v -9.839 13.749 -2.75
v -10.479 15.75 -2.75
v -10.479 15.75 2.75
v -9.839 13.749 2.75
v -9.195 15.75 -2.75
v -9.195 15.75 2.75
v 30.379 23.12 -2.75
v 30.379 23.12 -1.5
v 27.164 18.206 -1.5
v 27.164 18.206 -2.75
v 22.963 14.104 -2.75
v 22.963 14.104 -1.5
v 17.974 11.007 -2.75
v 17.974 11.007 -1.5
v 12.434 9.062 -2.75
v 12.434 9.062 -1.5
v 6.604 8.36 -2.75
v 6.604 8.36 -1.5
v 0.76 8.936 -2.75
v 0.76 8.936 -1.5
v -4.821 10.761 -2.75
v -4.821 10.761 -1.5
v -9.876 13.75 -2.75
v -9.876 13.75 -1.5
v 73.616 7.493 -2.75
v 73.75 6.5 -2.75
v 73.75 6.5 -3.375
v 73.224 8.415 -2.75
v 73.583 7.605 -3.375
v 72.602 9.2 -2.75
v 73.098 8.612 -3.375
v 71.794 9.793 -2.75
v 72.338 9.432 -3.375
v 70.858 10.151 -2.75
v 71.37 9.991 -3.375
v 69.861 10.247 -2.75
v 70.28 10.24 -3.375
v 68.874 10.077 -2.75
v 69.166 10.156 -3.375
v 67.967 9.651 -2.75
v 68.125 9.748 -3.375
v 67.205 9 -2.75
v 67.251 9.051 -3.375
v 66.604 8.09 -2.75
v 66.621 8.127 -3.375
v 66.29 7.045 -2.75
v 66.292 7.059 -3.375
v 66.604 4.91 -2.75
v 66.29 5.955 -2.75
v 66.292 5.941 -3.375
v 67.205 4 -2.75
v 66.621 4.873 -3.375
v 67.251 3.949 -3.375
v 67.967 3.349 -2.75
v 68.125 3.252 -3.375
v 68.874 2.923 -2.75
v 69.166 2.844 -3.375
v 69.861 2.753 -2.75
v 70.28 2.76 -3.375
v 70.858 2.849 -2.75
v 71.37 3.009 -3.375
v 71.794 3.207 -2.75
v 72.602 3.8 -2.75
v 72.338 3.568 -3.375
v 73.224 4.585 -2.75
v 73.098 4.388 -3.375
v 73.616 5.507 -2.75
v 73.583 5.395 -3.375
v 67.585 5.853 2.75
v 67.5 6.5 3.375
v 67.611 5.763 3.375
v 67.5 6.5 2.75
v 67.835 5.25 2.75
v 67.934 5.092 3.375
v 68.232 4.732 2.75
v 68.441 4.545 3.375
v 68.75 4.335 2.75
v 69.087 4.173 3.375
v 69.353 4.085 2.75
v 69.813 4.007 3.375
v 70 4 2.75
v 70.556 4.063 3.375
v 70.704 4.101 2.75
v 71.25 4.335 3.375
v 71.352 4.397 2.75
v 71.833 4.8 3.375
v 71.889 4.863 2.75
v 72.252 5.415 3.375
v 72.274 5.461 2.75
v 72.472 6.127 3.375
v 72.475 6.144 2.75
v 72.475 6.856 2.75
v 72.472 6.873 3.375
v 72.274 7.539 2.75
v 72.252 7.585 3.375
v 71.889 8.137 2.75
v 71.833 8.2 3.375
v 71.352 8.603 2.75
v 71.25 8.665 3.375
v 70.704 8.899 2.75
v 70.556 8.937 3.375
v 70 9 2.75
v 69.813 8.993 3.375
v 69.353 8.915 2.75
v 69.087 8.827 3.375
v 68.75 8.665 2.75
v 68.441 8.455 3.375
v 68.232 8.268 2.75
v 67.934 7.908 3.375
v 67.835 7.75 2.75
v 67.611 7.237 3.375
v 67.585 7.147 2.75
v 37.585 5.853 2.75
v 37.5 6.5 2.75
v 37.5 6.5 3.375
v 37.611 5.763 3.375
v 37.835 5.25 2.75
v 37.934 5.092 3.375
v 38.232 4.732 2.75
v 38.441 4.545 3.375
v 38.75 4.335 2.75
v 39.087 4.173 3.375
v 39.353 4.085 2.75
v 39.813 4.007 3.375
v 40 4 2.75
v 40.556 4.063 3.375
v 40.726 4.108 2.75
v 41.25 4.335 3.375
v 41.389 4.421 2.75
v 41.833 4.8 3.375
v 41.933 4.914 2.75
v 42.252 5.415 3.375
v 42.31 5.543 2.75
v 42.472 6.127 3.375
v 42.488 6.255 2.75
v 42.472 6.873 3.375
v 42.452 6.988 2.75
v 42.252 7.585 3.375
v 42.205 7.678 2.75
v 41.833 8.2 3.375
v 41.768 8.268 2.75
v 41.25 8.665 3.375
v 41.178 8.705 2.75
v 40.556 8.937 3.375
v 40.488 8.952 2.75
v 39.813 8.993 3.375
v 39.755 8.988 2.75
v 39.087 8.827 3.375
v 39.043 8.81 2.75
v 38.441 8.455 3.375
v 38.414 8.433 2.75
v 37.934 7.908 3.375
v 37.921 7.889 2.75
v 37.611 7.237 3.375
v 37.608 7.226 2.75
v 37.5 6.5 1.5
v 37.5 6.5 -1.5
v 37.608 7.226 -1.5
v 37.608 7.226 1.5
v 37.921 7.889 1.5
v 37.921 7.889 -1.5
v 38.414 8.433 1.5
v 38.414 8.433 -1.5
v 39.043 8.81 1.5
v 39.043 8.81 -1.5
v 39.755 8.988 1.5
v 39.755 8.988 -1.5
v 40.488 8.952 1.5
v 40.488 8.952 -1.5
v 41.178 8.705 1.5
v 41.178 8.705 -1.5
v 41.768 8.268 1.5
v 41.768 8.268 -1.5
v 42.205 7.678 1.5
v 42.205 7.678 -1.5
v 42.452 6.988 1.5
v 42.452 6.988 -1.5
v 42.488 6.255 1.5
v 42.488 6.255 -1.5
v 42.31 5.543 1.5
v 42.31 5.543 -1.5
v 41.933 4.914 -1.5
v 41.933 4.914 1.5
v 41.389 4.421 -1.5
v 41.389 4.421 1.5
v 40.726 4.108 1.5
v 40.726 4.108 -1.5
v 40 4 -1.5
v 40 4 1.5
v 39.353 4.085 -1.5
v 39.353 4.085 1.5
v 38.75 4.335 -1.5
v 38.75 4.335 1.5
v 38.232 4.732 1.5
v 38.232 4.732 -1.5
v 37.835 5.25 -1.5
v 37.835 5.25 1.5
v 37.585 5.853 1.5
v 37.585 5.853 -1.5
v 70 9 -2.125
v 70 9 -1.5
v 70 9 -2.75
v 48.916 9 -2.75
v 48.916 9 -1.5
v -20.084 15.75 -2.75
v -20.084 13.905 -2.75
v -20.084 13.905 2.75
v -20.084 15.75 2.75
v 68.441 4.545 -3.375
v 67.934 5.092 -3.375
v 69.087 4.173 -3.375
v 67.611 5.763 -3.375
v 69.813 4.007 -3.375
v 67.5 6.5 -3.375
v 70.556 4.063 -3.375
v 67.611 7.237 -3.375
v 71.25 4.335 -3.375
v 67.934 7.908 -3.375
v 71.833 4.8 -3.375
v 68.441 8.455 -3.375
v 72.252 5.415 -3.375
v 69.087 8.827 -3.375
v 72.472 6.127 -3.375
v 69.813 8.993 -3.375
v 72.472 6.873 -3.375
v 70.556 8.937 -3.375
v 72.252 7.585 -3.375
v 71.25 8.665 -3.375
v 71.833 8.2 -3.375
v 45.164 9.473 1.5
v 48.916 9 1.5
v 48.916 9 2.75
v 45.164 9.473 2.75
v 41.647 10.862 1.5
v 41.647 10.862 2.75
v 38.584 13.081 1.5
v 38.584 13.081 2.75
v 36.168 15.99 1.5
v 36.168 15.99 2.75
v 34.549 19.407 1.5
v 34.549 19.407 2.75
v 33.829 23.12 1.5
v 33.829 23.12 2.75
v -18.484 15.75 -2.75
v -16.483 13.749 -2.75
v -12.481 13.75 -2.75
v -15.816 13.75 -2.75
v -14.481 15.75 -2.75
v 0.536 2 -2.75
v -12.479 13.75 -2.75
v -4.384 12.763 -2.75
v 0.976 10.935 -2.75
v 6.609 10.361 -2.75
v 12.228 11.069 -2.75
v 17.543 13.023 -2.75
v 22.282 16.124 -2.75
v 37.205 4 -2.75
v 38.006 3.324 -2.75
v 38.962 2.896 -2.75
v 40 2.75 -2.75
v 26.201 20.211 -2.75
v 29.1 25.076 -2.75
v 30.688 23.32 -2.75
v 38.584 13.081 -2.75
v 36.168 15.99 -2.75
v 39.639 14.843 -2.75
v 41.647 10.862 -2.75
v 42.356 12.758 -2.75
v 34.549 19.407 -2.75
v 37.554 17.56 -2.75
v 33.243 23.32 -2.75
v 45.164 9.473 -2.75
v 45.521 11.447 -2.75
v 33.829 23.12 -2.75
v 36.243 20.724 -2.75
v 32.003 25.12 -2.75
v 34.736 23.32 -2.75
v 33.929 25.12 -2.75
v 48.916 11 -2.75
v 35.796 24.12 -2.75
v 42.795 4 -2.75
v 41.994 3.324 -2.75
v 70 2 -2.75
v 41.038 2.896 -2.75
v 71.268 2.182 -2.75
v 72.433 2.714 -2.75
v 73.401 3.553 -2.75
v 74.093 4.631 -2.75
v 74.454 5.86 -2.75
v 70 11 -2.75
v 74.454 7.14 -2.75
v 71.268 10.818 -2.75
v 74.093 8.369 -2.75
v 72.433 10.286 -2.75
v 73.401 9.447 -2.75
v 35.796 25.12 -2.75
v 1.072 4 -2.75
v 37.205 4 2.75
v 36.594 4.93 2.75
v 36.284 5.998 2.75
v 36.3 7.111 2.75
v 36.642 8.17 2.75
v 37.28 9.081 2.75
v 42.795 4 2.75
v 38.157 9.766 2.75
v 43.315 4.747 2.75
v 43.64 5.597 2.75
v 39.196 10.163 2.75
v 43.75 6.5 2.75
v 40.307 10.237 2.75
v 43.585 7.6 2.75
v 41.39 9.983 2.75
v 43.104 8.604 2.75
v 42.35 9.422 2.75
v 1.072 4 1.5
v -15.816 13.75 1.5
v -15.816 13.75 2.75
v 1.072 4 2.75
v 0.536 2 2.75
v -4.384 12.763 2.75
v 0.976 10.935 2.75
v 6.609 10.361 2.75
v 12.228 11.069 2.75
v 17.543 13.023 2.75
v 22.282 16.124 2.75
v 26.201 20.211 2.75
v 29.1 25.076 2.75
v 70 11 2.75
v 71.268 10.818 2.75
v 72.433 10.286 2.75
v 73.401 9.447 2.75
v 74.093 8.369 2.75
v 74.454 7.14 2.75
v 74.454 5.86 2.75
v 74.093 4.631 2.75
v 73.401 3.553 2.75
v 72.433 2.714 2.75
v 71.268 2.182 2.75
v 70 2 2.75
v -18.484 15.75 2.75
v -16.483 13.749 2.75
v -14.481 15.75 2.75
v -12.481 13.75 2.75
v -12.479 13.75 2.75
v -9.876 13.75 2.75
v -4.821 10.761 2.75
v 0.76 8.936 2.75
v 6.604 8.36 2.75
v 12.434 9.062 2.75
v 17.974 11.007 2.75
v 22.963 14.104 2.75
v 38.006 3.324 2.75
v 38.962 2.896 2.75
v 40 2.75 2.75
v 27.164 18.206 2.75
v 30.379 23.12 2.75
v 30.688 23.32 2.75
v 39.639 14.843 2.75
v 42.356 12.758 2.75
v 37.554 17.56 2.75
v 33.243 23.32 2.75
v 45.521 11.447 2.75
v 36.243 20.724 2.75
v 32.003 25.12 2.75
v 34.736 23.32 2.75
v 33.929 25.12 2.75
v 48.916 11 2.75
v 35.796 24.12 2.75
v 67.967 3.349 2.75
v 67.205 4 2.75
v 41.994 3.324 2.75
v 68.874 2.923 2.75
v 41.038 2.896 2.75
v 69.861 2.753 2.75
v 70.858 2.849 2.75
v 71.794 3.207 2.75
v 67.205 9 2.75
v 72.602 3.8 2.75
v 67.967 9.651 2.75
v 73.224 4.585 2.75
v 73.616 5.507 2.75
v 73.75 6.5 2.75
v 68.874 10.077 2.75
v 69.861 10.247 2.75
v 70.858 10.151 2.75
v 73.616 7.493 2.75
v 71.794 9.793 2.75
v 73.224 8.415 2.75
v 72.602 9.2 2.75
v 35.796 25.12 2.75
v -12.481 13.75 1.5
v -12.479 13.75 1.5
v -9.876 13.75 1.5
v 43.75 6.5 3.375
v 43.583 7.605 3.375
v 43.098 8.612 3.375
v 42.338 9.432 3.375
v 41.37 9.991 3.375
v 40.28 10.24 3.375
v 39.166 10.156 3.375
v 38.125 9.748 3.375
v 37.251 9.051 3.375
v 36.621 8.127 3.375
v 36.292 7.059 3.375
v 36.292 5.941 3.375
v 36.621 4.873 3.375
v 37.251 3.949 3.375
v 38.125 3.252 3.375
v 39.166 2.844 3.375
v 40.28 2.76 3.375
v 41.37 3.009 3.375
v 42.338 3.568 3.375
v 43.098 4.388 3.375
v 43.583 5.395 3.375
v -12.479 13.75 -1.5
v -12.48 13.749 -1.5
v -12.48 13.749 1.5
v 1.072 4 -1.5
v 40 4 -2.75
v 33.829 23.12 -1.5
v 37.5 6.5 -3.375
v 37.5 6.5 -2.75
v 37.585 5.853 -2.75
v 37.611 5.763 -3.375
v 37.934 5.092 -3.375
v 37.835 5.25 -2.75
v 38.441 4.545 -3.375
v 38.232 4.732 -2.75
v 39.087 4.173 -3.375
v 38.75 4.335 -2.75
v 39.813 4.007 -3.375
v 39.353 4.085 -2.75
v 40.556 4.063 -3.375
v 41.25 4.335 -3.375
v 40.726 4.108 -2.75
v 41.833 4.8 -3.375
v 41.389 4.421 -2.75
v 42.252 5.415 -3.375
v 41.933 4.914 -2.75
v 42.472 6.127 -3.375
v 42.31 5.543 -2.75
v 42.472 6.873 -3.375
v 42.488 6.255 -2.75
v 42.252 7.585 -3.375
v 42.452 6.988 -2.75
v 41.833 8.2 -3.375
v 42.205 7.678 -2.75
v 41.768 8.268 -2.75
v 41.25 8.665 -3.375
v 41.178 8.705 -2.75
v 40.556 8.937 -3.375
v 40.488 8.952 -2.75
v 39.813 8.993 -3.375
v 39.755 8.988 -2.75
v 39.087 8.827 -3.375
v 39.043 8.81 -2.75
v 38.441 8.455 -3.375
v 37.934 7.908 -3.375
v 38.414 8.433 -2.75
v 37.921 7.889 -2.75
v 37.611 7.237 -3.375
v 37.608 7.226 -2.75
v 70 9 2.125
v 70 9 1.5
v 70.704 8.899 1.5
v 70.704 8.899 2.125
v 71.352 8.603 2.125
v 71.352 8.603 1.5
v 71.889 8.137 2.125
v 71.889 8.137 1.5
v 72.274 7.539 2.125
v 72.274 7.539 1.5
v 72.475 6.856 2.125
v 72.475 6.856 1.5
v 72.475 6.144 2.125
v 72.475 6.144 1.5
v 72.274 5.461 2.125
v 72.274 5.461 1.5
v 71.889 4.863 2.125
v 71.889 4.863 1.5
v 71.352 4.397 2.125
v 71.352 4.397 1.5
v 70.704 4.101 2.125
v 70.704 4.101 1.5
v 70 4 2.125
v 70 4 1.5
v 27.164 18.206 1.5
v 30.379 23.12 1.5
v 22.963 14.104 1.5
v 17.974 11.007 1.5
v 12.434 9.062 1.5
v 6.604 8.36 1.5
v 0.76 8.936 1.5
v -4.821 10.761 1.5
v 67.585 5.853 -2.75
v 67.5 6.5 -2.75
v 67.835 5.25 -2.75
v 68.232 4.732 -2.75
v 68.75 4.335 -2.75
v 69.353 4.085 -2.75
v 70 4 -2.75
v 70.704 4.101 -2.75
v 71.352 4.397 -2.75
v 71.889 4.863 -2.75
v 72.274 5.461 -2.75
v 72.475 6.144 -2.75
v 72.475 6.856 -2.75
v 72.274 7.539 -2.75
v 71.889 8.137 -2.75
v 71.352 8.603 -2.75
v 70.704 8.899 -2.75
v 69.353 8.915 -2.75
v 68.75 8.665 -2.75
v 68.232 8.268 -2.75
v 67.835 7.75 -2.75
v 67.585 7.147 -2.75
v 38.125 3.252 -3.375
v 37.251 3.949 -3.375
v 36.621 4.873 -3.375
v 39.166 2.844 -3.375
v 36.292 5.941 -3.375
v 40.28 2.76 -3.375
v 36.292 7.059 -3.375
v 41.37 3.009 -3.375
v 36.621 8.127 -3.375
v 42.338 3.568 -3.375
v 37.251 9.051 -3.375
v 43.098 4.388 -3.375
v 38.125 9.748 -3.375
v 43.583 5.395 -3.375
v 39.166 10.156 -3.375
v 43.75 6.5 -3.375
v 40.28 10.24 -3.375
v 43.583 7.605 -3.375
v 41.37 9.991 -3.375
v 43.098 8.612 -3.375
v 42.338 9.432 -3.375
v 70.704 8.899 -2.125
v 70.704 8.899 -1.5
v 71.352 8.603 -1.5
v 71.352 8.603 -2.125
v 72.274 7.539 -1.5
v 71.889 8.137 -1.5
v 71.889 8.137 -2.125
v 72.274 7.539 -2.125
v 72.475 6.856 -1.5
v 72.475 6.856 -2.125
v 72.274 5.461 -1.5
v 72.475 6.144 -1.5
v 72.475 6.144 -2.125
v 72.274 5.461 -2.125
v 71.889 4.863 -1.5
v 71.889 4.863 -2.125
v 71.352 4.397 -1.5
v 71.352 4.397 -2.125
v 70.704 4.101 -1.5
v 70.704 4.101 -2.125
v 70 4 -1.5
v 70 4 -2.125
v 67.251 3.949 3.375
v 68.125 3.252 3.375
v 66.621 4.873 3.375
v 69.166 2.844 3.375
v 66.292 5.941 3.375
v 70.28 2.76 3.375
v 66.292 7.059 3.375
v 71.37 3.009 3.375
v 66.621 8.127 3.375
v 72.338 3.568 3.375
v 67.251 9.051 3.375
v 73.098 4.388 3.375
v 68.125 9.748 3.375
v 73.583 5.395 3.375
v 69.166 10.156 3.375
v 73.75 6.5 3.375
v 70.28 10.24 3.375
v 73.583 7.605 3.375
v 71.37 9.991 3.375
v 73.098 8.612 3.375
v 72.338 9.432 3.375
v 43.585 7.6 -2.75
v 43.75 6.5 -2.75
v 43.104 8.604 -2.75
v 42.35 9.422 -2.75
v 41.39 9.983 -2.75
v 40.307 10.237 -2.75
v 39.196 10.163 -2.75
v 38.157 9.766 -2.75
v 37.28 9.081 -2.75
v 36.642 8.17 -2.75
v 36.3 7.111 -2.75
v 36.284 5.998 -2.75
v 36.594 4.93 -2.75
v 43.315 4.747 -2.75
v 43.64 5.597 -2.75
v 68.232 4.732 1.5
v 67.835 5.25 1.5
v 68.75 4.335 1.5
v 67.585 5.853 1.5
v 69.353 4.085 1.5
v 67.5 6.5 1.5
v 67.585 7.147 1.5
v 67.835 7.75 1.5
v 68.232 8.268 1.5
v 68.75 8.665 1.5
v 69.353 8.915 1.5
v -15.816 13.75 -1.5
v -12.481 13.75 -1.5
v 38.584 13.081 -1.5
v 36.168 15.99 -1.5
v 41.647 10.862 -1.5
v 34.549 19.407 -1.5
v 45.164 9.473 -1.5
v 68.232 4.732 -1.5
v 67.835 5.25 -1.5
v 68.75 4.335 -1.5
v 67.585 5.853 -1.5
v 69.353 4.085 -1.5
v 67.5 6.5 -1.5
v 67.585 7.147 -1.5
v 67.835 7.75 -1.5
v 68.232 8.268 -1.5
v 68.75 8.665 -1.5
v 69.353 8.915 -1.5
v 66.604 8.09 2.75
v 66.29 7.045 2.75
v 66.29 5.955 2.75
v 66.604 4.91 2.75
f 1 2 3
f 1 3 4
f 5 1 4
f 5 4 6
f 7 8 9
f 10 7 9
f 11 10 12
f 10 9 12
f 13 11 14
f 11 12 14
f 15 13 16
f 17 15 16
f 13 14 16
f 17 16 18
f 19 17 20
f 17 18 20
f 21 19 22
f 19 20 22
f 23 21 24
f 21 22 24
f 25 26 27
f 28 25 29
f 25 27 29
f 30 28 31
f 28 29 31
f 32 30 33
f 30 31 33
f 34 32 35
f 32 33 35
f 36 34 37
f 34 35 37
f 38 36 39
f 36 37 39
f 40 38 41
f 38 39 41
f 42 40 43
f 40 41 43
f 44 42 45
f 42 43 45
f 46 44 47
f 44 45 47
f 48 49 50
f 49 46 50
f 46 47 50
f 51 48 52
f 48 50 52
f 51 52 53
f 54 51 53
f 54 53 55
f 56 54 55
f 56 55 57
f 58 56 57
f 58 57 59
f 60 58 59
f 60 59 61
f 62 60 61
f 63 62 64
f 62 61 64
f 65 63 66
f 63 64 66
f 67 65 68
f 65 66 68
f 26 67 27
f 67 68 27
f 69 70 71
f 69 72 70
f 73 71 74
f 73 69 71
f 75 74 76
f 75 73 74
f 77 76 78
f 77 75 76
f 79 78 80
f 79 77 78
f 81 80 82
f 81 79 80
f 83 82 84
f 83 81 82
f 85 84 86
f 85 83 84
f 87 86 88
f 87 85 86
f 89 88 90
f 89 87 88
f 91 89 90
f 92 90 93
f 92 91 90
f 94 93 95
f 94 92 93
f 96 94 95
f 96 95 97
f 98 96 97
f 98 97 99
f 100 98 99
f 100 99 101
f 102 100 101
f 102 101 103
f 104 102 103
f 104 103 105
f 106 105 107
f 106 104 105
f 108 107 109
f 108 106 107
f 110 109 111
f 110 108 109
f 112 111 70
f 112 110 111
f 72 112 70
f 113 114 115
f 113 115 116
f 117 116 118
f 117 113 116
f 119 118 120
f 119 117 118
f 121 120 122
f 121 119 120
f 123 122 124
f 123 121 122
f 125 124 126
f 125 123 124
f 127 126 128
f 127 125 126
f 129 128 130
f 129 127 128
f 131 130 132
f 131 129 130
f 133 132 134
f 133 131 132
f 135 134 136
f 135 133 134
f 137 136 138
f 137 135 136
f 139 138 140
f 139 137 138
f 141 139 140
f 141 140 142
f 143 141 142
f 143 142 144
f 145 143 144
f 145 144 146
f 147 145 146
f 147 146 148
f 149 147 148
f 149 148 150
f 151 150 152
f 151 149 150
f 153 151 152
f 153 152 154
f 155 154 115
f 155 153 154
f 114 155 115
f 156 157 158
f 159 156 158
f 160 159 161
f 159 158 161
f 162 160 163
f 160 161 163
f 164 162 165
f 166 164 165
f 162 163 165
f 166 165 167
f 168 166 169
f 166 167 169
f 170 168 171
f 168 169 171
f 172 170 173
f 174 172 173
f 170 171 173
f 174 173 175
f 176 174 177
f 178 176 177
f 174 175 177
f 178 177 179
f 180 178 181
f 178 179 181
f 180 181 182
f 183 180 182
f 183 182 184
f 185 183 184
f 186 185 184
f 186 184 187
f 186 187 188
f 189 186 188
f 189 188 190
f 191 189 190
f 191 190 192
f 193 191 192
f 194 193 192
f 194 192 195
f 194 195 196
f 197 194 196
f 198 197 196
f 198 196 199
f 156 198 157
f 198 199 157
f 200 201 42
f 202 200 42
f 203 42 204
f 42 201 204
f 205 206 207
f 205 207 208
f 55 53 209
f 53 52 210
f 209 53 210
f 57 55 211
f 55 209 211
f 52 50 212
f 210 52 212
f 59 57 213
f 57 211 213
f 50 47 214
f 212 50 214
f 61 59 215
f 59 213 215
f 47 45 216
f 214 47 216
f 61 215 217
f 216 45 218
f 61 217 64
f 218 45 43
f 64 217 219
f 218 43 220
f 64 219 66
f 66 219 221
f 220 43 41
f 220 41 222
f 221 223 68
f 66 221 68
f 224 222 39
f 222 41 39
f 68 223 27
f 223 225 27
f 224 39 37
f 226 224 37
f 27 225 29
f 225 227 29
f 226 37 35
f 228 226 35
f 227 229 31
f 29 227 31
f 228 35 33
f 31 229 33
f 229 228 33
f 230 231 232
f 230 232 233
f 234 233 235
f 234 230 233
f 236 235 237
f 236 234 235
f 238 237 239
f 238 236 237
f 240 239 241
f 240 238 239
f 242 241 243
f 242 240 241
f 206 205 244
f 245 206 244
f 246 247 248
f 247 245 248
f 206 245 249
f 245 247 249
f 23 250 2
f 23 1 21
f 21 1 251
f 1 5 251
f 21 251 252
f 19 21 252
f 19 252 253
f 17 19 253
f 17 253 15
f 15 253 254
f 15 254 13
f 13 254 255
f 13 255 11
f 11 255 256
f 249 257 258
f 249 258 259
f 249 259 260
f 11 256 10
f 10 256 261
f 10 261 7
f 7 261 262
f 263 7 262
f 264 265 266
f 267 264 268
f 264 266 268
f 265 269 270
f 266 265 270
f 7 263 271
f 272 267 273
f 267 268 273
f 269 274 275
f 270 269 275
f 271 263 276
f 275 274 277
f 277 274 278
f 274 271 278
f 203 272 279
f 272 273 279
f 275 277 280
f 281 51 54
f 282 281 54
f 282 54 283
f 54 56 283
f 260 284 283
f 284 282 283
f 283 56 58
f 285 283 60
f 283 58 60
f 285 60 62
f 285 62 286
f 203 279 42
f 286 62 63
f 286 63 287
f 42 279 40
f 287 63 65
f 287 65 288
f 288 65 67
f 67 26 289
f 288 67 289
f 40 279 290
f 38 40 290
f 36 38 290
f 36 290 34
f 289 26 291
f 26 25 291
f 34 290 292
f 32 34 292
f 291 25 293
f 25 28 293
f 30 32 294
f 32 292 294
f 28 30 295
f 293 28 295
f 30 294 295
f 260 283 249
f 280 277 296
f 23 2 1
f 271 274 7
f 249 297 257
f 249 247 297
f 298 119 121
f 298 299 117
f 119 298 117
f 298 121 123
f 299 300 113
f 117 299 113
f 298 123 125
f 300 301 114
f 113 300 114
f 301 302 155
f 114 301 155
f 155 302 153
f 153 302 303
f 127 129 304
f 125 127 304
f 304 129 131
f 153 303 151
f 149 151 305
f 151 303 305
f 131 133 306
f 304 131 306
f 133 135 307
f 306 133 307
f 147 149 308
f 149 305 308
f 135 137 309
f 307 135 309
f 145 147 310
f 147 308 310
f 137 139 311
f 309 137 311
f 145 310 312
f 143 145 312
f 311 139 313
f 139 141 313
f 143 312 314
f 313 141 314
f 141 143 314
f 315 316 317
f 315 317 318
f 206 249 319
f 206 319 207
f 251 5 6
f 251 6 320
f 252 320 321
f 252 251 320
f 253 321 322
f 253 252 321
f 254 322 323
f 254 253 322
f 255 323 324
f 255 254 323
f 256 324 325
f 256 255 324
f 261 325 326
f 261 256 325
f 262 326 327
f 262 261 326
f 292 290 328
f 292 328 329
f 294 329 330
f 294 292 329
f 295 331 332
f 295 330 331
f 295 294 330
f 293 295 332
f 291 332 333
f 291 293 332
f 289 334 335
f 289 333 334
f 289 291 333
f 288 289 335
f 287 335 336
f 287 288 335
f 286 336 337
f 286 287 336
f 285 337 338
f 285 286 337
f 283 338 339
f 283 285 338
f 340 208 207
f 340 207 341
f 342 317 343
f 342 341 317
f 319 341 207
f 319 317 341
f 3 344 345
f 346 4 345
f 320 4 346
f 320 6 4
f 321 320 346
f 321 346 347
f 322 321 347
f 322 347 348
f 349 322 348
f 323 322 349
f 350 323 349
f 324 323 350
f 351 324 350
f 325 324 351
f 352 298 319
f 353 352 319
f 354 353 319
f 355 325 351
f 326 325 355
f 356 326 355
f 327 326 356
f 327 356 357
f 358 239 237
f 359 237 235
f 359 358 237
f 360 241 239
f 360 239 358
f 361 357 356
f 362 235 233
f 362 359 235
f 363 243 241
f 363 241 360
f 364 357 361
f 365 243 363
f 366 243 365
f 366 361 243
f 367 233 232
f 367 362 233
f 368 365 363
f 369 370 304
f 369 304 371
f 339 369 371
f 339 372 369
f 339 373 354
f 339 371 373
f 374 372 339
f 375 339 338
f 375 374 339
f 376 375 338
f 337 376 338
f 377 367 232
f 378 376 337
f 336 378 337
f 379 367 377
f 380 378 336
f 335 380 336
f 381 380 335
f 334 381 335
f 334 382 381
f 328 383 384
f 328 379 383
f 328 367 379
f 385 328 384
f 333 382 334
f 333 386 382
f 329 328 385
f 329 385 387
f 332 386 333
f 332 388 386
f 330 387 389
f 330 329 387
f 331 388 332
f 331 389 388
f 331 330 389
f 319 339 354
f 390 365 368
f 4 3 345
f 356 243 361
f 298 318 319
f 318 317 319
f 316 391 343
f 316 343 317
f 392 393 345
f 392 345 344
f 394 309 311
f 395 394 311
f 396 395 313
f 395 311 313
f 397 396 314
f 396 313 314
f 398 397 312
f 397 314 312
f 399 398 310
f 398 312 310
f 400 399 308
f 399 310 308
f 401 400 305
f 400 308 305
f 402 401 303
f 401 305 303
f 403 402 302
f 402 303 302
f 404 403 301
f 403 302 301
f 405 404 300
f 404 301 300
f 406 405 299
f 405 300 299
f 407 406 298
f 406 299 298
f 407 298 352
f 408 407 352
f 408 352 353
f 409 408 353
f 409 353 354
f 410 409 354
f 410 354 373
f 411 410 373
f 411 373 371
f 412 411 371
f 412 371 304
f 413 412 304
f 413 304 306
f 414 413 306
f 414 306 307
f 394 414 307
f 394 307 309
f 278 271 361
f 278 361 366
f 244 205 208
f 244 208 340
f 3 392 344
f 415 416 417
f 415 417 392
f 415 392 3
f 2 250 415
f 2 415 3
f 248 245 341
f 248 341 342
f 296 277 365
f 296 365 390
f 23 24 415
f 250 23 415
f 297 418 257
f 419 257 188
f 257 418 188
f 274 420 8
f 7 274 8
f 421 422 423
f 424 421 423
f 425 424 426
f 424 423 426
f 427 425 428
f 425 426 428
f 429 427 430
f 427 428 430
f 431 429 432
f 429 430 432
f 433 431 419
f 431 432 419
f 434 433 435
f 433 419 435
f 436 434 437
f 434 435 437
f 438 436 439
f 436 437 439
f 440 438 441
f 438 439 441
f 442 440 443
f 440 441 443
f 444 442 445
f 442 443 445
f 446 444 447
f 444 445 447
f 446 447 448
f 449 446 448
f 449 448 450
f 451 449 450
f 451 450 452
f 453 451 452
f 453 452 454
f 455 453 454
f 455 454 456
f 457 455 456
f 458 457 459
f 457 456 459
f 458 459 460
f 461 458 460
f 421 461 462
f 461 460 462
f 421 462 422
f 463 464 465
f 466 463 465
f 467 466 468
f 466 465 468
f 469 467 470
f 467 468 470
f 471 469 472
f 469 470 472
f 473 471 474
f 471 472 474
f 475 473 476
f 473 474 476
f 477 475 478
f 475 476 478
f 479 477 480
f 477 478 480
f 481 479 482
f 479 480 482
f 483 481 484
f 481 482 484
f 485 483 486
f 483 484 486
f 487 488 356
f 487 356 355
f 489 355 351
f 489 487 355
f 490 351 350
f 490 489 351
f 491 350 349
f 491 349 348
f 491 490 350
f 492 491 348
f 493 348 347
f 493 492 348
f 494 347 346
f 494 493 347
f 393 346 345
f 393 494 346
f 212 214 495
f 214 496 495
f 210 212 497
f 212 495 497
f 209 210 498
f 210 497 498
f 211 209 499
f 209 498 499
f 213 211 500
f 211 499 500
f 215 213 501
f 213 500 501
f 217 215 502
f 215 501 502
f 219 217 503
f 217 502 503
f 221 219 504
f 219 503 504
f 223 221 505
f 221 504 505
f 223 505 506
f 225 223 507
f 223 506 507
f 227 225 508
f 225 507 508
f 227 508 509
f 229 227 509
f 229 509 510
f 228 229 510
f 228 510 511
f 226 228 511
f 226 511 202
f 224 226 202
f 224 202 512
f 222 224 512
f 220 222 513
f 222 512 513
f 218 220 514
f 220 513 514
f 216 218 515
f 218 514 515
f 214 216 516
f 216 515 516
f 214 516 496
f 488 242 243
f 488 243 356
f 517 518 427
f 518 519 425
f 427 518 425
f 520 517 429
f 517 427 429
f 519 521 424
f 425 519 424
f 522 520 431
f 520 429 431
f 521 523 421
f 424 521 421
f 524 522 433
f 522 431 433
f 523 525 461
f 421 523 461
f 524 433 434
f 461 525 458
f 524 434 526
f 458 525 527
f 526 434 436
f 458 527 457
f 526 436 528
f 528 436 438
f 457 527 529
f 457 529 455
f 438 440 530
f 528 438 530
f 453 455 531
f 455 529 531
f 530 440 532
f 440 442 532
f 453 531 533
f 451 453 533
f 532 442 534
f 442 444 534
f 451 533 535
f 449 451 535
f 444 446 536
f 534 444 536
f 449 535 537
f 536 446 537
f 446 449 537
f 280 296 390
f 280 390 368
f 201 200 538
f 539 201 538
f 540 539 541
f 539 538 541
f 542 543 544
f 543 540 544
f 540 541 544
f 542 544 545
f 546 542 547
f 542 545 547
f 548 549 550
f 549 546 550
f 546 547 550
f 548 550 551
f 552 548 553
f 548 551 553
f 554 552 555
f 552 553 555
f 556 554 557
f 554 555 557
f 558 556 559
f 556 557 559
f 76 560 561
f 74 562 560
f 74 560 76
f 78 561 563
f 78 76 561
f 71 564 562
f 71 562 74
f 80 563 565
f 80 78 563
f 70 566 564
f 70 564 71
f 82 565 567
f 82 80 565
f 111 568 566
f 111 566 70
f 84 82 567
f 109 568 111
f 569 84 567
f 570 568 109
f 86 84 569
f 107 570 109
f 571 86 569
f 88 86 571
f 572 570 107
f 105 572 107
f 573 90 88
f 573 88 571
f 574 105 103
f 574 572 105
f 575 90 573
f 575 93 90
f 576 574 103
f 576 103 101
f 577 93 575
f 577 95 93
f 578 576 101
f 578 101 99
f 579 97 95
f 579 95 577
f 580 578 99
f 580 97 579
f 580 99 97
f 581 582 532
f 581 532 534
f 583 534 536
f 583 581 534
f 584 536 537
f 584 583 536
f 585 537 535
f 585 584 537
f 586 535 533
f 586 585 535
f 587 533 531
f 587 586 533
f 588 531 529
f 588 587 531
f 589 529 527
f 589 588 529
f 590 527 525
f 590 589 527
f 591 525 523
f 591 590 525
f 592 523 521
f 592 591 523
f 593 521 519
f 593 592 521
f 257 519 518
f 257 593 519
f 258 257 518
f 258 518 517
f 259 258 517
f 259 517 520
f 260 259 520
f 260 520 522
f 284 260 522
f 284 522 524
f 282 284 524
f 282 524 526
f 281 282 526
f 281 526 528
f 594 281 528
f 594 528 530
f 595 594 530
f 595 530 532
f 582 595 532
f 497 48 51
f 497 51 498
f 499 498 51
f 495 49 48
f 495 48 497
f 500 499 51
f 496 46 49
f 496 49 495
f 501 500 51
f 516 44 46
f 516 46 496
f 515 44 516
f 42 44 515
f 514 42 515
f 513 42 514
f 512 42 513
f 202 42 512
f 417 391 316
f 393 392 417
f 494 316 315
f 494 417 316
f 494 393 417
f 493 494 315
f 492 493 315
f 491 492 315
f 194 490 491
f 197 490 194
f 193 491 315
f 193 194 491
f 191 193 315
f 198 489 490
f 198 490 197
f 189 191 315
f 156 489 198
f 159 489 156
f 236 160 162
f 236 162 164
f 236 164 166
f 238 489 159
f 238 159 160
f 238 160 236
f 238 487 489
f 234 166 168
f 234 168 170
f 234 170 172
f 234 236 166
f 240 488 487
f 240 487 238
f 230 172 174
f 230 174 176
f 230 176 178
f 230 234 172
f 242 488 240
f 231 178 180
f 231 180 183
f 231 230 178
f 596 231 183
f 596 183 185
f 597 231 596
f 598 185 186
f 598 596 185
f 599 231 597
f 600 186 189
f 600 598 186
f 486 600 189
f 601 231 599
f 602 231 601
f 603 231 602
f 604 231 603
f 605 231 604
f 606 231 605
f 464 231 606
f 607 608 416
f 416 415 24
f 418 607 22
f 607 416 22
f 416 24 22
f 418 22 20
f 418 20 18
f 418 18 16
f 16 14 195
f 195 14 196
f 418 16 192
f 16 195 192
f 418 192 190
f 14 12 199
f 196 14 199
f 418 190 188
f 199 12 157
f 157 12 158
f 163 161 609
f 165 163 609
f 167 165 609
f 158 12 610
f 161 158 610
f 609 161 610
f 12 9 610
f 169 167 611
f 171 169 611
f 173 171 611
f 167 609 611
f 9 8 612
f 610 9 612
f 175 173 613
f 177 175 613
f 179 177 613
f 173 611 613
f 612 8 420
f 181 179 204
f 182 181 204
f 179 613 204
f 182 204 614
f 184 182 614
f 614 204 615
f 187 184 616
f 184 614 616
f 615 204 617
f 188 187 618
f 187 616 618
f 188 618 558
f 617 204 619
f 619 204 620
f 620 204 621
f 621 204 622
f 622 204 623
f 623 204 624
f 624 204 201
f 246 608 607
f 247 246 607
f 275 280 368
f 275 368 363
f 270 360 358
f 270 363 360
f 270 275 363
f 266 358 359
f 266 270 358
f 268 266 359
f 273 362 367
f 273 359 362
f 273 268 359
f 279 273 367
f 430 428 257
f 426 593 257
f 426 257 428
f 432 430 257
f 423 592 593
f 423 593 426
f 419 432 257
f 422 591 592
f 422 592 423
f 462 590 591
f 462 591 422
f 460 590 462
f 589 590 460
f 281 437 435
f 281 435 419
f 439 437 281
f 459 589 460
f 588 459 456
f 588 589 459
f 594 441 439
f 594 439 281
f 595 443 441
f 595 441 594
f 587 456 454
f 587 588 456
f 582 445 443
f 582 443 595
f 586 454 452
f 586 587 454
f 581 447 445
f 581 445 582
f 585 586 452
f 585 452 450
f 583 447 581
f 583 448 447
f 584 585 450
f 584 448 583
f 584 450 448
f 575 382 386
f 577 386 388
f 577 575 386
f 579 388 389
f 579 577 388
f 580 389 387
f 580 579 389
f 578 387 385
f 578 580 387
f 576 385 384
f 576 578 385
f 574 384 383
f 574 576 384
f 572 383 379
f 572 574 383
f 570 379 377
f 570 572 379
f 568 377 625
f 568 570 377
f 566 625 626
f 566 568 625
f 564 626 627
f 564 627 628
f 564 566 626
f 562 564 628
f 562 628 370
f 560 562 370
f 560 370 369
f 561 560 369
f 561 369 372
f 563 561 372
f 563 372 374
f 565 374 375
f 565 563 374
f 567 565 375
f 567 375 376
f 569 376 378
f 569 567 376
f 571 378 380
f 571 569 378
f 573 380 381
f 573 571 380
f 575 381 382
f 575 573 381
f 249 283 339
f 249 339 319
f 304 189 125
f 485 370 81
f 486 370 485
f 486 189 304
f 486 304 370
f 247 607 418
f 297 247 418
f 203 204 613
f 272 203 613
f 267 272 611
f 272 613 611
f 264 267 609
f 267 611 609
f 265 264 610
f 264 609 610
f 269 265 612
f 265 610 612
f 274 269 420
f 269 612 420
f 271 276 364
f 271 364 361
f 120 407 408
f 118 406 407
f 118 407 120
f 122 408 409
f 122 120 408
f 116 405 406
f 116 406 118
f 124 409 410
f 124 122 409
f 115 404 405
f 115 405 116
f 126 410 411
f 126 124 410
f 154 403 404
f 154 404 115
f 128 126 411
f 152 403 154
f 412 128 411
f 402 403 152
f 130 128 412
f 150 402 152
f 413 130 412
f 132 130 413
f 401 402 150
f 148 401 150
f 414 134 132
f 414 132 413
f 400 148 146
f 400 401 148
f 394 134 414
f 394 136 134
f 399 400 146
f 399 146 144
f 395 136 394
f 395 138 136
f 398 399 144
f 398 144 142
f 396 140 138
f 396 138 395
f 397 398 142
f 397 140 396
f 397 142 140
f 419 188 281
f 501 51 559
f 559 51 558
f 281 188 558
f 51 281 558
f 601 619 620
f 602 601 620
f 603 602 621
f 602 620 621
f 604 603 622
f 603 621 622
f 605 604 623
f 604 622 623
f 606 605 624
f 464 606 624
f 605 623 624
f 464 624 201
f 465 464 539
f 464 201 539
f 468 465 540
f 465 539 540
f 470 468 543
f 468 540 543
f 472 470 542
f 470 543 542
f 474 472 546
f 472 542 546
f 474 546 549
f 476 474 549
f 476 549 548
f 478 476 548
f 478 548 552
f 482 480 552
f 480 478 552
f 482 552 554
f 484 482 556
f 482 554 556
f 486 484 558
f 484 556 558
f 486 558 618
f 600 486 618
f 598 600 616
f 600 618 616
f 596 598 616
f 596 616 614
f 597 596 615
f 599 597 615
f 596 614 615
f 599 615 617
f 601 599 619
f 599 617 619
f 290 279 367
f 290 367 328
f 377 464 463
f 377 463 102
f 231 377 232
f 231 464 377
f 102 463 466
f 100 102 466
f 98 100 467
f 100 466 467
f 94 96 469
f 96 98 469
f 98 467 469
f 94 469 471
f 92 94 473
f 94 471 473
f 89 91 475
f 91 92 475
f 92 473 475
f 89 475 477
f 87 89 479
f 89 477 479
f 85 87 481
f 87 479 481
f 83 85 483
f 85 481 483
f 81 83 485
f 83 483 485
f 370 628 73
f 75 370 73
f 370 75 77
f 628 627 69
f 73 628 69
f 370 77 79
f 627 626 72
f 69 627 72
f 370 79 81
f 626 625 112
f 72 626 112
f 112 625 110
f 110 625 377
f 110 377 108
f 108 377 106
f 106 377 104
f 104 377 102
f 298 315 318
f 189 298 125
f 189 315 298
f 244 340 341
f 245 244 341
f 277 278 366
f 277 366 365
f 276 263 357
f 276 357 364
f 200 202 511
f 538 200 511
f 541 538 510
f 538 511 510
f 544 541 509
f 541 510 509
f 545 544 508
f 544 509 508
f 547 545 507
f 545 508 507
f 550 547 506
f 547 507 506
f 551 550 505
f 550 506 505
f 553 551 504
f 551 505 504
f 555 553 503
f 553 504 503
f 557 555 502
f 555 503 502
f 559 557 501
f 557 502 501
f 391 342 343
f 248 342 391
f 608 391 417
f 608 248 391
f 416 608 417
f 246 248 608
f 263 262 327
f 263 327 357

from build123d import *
from build123d.topology import SkipClean

# Parameters (mm, degrees)
BOSS_EXTRUDE1_DEPTH     = 4
SKETCH3_R               = 2.5
CUT_EXTRUDE1_DEPTH      = 82.558227053
CUT_EXTRUDE2_DEPTH      = 1.25
SKETCH5_R               = 3.75
SKETCH5_R_2             = 2.5
BOSS_EXTRUDE2_DEPTH     = 0.625
CUT_EXTRUDE3_DEPTH      = 82.558227053
CUT_EXTRUDE4_START      = -1.25
CUT_EXTRUDE4_DEPTH      = 1.25
CUT_EXTRUDE5_DEPTH      = 79.859241849
CUT_EXTRUDE5_DEPTH_BACK = 79.859241849
CUT_EXTRUDE6_DEPTH      = 79.859241849
CUT_EXTRUDE6_DEPTH_BACK = 79.859241849


with BuildPart() as part:
    # Sketch1 → Boss-Extrude1 (new, symmetric)
    with BuildSketch(Plane.XY):
        with BuildLine():
            Line((0, 0), (70, 0))
            ThreePointArc((70, 0), (76.5, 6.5), (70, 13))
            Line((70, 13), (48.916352203, 13))
            ThreePointArc((48.916352203, 13), (41.053324797, 16.256972593), (37.796352203, 24.12))
            Line((37.796352203, 24.12), (37.796352203, 27.12))
            Line((37.796352203, 27.12), (27.786352203, 27.12))
            ThreePointArc((27.786352203, 27.12), (12.065558159, 13.089935965), (-8.483647797, 17.75))
            Line((-8.483647797, 17.75), (-22.083647797, 17.75))
            Line((-22.083647797, 17.75), (-22.083647797, 12.75))
            Line((-22.083647797, 12.75), (0, 0))
        make_face()
    extrude(amount=BOSS_EXTRUDE1_DEPTH, both=True)

    # Sketch3 → Cut-Extrude1 (cut, through all)
    with BuildSketch(Plane(origin=(0, 0, -4), x_dir=(-1, 0, 0), z_dir=(0, 0, -1))):
        with Locations((-70, 6.5)):
            Circle(SKETCH3_R)
        with Locations((-40, 6.5)):
            Circle(SKETCH3_R)
    extrude(amount=-CUT_EXTRUDE1_DEPTH, mode=Mode.SUBTRACT)

    # Sketch4 → Cut-Extrude2 (cut)
    with BuildSketch(Plane.XY.offset(4)):
        with BuildLine():
            Line((-20.083647797, 13.904700538), (0.535898385, 2))
            Line((0.535898385, 2), (70, 2))
            ThreePointArc((70, 2), (74.5, 6.5), (70, 11))
            Line((70, 11), (48.916352203, 11))
            ThreePointArc((48.916352203, 11), (39.639111234, 14.842759031), (35.796352203, 24.12))
            Line((35.796352203, 24.12), (35.796352203, 25.12))
            Line((35.796352203, 25.12), (29.119764251, 25.12))
            ThreePointArc((29.119764251, 25.12), (12.251390397, 11.074453376), (-9.195256898, 15.75))
            Line((-9.195256898, 15.75), (-20.083647797, 15.75))
            Line((-20.083647797, 15.75), (-20.083647797, 13.904700538))
        make_face()
    cut_extrude2 = extrude(amount=-CUT_EXTRUDE2_DEPTH, mode=Mode.SUBTRACT)

    # Sketch5 → Boss-Extrude2 (add, symmetric)
    # profile 1 of 2: a face of its own
    with SkipClean():  # the faces are left unmerged after this step: merging them gives an invalid solid
        with BuildSketch(Plane.XY.offset(2.75)):
            with Locations((40, 6.5)):
                Circle(SKETCH5_R)
            with Locations((40, 6.5)):
                Circle(SKETCH5_R_2, mode=Mode.SUBTRACT)
        # profile 2 of 2: a face of its own
        with BuildSketch(Plane.XY.offset(2.75)):
            with Locations((70, 6.5)):
                Circle(SKETCH5_R)
            with Locations((70, 6.5)):
                Circle(SKETCH5_R_2, mode=Mode.SUBTRACT)
        boss_extrude2 = extrude(amount=BOSS_EXTRUDE2_DEPTH, both=True)

    # Mirror1: Cut-Extrude2, Boss-Extrude2 across plane
    add(cut_extrude2.mirror(Plane.XY), mode=Mode.SUBTRACT)
    add(boss_extrude2.mirror(Plane.XY))

    # Sketch7 → Cut-Extrude3 (cut, through all)
    with BuildSketch(Plane.XY.offset(4)):
        with BuildLine():
            Line((-22.083647797, 17.75), (-22.083647797, 12.75))
            Line((-22.083647797, 12.75), (0, 0))
            Line((0, 0), (70, 0))
            ThreePointArc((70, 0), (76.5, 6.5), (70, 13))
            Line((70, 13), (48.916352203, 13))
            ThreePointArc((48.916352203, 13), (41.053324797, 16.256972593), (37.796352203, 24.12))
            Line((37.796352203, 24.12), (37.796352203, 27.12))
            Line((37.796352203, 27.12), (27.786352203, 27.12))
            ThreePointArc((27.786352203, 27.12), (12.065558159, 13.089935965), (-8.483647797, 17.75))
            Line((-8.483647797, 17.75), (-22.083647797, 17.75))
        make_face()
        with BuildLine():
            Line((70, 2), (0.535898385, 2))
            Line((0.535898385, 2), (-20.083647797, 13.904700538))
            Line((-20.083647797, 13.904700538), (-20.083647797, 15.75))
            Line((-20.083647797, 15.75), (-9.195256898, 15.75))
            ThreePointArc((-9.195256898, 15.75), (12.251390397, 11.074453376), (29.119764251, 25.12))
            Line((29.119764251, 25.12), (35.796352203, 25.12))
            Line((35.796352203, 25.12), (35.796352203, 24.12))
            ThreePointArc((35.796352203, 24.12), (39.639111234, 14.842759031), (48.916352203, 11))
            Line((48.916352203, 11), (70, 11))
            ThreePointArc((70, 11), (74.5, 6.5), (70, 2))
        make_face(mode=Mode.SUBTRACT)
    cut_extrude3 = extrude(amount=-CUT_EXTRUDE3_DEPTH, mode=Mode.SUBTRACT)

    # Sketch8 → Cut-Extrude4 (cut)
    with BuildSketch(Plane.XY.offset(2.75).offset(CUT_EXTRUDE4_START)):
        with BuildLine():
            Line((-15.815698604, 13.75), (1.07179677, 4))
            Line((1.07179677, 4), (70, 4))
            ThreePointArc((70, 4), (72.5, 6.5), (70, 9))
            Line((70, 9), (48.916352203, 9))
            ThreePointArc((48.916352203, 9), (38.584498546, 13.080652193), (33.829457228, 23.12))
            Line((33.829457228, 23.12), (30.37941216, 23.12))
            ThreePointArc((30.37941216, 23.12), (12.433656393, 9.061817656), (-9.875614934, 13.75))
            Line((-9.875614934, 13.75), (-15.815698604, 13.75))
        make_face()
    cut_extrude4 = extrude(amount=CUT_EXTRUDE4_DEPTH, mode=Mode.SUBTRACT)

    # Mirror2: Cut-Extrude3, Cut-Extrude4 across plane
    add(cut_extrude3.mirror(Plane.XY), mode=Mode.SUBTRACT)
    add(cut_extrude4.mirror(Plane.XY), mode=Mode.SUBTRACT)

    # Sketch9 → Cut-Extrude5 (cut, two sides: drawn at the far end of the back side and taken through both)
    with BuildSketch(Plane.XY.offset(2.75).offset(-CUT_EXTRUDE5_DEPTH_BACK)):
        Polygon((-158.483427763, 155.749779966), (-18.483647797, 15.75), (-16.482535606, 13.748887809), (-14.481423415, 15.75), (-12.480311224, 13.748887809), (-10.479199033, 15.75), (-9.839204987, 13.748887809), (-9.195256898, 15.75), (51.453981857, 204.221606933), (-37.628855278, 590.05026742), (-247.566264898, 541.578440454), align=None)
    extrude(amount=CUT_EXTRUDE5_DEPTH + CUT_EXTRUDE5_DEPTH_BACK, mode=Mode.SUBTRACT)

    # Sketch11 → Cut-Extrude6 (cut, two sides: drawn at the far end of the back side and taken through both)
    with BuildSketch(Plane.XY.offset(2.75).offset(-CUT_EXTRUDE6_DEPTH_BACK)):
        Polygon((-58.744613452, 122.187820826), (29.099875124, 25.075811319), (30.688127166, 23.32), (32.002745662, 25.12), (33.242951791, 23.32), (33.9290832, 25.12), (34.735542366, 23.32), (35.796352203, 25.12), (102.28212416, 137.934177705), (76.793604285, 398.587053404), (-84.233133328, 382.840696525), align=None)
    extrude(amount=CUT_EXTRUDE6_DEPTH + CUT_EXTRUDE6_DEPTH_BACK, mode=Mode.SUBTRACT)


solid = part.part
